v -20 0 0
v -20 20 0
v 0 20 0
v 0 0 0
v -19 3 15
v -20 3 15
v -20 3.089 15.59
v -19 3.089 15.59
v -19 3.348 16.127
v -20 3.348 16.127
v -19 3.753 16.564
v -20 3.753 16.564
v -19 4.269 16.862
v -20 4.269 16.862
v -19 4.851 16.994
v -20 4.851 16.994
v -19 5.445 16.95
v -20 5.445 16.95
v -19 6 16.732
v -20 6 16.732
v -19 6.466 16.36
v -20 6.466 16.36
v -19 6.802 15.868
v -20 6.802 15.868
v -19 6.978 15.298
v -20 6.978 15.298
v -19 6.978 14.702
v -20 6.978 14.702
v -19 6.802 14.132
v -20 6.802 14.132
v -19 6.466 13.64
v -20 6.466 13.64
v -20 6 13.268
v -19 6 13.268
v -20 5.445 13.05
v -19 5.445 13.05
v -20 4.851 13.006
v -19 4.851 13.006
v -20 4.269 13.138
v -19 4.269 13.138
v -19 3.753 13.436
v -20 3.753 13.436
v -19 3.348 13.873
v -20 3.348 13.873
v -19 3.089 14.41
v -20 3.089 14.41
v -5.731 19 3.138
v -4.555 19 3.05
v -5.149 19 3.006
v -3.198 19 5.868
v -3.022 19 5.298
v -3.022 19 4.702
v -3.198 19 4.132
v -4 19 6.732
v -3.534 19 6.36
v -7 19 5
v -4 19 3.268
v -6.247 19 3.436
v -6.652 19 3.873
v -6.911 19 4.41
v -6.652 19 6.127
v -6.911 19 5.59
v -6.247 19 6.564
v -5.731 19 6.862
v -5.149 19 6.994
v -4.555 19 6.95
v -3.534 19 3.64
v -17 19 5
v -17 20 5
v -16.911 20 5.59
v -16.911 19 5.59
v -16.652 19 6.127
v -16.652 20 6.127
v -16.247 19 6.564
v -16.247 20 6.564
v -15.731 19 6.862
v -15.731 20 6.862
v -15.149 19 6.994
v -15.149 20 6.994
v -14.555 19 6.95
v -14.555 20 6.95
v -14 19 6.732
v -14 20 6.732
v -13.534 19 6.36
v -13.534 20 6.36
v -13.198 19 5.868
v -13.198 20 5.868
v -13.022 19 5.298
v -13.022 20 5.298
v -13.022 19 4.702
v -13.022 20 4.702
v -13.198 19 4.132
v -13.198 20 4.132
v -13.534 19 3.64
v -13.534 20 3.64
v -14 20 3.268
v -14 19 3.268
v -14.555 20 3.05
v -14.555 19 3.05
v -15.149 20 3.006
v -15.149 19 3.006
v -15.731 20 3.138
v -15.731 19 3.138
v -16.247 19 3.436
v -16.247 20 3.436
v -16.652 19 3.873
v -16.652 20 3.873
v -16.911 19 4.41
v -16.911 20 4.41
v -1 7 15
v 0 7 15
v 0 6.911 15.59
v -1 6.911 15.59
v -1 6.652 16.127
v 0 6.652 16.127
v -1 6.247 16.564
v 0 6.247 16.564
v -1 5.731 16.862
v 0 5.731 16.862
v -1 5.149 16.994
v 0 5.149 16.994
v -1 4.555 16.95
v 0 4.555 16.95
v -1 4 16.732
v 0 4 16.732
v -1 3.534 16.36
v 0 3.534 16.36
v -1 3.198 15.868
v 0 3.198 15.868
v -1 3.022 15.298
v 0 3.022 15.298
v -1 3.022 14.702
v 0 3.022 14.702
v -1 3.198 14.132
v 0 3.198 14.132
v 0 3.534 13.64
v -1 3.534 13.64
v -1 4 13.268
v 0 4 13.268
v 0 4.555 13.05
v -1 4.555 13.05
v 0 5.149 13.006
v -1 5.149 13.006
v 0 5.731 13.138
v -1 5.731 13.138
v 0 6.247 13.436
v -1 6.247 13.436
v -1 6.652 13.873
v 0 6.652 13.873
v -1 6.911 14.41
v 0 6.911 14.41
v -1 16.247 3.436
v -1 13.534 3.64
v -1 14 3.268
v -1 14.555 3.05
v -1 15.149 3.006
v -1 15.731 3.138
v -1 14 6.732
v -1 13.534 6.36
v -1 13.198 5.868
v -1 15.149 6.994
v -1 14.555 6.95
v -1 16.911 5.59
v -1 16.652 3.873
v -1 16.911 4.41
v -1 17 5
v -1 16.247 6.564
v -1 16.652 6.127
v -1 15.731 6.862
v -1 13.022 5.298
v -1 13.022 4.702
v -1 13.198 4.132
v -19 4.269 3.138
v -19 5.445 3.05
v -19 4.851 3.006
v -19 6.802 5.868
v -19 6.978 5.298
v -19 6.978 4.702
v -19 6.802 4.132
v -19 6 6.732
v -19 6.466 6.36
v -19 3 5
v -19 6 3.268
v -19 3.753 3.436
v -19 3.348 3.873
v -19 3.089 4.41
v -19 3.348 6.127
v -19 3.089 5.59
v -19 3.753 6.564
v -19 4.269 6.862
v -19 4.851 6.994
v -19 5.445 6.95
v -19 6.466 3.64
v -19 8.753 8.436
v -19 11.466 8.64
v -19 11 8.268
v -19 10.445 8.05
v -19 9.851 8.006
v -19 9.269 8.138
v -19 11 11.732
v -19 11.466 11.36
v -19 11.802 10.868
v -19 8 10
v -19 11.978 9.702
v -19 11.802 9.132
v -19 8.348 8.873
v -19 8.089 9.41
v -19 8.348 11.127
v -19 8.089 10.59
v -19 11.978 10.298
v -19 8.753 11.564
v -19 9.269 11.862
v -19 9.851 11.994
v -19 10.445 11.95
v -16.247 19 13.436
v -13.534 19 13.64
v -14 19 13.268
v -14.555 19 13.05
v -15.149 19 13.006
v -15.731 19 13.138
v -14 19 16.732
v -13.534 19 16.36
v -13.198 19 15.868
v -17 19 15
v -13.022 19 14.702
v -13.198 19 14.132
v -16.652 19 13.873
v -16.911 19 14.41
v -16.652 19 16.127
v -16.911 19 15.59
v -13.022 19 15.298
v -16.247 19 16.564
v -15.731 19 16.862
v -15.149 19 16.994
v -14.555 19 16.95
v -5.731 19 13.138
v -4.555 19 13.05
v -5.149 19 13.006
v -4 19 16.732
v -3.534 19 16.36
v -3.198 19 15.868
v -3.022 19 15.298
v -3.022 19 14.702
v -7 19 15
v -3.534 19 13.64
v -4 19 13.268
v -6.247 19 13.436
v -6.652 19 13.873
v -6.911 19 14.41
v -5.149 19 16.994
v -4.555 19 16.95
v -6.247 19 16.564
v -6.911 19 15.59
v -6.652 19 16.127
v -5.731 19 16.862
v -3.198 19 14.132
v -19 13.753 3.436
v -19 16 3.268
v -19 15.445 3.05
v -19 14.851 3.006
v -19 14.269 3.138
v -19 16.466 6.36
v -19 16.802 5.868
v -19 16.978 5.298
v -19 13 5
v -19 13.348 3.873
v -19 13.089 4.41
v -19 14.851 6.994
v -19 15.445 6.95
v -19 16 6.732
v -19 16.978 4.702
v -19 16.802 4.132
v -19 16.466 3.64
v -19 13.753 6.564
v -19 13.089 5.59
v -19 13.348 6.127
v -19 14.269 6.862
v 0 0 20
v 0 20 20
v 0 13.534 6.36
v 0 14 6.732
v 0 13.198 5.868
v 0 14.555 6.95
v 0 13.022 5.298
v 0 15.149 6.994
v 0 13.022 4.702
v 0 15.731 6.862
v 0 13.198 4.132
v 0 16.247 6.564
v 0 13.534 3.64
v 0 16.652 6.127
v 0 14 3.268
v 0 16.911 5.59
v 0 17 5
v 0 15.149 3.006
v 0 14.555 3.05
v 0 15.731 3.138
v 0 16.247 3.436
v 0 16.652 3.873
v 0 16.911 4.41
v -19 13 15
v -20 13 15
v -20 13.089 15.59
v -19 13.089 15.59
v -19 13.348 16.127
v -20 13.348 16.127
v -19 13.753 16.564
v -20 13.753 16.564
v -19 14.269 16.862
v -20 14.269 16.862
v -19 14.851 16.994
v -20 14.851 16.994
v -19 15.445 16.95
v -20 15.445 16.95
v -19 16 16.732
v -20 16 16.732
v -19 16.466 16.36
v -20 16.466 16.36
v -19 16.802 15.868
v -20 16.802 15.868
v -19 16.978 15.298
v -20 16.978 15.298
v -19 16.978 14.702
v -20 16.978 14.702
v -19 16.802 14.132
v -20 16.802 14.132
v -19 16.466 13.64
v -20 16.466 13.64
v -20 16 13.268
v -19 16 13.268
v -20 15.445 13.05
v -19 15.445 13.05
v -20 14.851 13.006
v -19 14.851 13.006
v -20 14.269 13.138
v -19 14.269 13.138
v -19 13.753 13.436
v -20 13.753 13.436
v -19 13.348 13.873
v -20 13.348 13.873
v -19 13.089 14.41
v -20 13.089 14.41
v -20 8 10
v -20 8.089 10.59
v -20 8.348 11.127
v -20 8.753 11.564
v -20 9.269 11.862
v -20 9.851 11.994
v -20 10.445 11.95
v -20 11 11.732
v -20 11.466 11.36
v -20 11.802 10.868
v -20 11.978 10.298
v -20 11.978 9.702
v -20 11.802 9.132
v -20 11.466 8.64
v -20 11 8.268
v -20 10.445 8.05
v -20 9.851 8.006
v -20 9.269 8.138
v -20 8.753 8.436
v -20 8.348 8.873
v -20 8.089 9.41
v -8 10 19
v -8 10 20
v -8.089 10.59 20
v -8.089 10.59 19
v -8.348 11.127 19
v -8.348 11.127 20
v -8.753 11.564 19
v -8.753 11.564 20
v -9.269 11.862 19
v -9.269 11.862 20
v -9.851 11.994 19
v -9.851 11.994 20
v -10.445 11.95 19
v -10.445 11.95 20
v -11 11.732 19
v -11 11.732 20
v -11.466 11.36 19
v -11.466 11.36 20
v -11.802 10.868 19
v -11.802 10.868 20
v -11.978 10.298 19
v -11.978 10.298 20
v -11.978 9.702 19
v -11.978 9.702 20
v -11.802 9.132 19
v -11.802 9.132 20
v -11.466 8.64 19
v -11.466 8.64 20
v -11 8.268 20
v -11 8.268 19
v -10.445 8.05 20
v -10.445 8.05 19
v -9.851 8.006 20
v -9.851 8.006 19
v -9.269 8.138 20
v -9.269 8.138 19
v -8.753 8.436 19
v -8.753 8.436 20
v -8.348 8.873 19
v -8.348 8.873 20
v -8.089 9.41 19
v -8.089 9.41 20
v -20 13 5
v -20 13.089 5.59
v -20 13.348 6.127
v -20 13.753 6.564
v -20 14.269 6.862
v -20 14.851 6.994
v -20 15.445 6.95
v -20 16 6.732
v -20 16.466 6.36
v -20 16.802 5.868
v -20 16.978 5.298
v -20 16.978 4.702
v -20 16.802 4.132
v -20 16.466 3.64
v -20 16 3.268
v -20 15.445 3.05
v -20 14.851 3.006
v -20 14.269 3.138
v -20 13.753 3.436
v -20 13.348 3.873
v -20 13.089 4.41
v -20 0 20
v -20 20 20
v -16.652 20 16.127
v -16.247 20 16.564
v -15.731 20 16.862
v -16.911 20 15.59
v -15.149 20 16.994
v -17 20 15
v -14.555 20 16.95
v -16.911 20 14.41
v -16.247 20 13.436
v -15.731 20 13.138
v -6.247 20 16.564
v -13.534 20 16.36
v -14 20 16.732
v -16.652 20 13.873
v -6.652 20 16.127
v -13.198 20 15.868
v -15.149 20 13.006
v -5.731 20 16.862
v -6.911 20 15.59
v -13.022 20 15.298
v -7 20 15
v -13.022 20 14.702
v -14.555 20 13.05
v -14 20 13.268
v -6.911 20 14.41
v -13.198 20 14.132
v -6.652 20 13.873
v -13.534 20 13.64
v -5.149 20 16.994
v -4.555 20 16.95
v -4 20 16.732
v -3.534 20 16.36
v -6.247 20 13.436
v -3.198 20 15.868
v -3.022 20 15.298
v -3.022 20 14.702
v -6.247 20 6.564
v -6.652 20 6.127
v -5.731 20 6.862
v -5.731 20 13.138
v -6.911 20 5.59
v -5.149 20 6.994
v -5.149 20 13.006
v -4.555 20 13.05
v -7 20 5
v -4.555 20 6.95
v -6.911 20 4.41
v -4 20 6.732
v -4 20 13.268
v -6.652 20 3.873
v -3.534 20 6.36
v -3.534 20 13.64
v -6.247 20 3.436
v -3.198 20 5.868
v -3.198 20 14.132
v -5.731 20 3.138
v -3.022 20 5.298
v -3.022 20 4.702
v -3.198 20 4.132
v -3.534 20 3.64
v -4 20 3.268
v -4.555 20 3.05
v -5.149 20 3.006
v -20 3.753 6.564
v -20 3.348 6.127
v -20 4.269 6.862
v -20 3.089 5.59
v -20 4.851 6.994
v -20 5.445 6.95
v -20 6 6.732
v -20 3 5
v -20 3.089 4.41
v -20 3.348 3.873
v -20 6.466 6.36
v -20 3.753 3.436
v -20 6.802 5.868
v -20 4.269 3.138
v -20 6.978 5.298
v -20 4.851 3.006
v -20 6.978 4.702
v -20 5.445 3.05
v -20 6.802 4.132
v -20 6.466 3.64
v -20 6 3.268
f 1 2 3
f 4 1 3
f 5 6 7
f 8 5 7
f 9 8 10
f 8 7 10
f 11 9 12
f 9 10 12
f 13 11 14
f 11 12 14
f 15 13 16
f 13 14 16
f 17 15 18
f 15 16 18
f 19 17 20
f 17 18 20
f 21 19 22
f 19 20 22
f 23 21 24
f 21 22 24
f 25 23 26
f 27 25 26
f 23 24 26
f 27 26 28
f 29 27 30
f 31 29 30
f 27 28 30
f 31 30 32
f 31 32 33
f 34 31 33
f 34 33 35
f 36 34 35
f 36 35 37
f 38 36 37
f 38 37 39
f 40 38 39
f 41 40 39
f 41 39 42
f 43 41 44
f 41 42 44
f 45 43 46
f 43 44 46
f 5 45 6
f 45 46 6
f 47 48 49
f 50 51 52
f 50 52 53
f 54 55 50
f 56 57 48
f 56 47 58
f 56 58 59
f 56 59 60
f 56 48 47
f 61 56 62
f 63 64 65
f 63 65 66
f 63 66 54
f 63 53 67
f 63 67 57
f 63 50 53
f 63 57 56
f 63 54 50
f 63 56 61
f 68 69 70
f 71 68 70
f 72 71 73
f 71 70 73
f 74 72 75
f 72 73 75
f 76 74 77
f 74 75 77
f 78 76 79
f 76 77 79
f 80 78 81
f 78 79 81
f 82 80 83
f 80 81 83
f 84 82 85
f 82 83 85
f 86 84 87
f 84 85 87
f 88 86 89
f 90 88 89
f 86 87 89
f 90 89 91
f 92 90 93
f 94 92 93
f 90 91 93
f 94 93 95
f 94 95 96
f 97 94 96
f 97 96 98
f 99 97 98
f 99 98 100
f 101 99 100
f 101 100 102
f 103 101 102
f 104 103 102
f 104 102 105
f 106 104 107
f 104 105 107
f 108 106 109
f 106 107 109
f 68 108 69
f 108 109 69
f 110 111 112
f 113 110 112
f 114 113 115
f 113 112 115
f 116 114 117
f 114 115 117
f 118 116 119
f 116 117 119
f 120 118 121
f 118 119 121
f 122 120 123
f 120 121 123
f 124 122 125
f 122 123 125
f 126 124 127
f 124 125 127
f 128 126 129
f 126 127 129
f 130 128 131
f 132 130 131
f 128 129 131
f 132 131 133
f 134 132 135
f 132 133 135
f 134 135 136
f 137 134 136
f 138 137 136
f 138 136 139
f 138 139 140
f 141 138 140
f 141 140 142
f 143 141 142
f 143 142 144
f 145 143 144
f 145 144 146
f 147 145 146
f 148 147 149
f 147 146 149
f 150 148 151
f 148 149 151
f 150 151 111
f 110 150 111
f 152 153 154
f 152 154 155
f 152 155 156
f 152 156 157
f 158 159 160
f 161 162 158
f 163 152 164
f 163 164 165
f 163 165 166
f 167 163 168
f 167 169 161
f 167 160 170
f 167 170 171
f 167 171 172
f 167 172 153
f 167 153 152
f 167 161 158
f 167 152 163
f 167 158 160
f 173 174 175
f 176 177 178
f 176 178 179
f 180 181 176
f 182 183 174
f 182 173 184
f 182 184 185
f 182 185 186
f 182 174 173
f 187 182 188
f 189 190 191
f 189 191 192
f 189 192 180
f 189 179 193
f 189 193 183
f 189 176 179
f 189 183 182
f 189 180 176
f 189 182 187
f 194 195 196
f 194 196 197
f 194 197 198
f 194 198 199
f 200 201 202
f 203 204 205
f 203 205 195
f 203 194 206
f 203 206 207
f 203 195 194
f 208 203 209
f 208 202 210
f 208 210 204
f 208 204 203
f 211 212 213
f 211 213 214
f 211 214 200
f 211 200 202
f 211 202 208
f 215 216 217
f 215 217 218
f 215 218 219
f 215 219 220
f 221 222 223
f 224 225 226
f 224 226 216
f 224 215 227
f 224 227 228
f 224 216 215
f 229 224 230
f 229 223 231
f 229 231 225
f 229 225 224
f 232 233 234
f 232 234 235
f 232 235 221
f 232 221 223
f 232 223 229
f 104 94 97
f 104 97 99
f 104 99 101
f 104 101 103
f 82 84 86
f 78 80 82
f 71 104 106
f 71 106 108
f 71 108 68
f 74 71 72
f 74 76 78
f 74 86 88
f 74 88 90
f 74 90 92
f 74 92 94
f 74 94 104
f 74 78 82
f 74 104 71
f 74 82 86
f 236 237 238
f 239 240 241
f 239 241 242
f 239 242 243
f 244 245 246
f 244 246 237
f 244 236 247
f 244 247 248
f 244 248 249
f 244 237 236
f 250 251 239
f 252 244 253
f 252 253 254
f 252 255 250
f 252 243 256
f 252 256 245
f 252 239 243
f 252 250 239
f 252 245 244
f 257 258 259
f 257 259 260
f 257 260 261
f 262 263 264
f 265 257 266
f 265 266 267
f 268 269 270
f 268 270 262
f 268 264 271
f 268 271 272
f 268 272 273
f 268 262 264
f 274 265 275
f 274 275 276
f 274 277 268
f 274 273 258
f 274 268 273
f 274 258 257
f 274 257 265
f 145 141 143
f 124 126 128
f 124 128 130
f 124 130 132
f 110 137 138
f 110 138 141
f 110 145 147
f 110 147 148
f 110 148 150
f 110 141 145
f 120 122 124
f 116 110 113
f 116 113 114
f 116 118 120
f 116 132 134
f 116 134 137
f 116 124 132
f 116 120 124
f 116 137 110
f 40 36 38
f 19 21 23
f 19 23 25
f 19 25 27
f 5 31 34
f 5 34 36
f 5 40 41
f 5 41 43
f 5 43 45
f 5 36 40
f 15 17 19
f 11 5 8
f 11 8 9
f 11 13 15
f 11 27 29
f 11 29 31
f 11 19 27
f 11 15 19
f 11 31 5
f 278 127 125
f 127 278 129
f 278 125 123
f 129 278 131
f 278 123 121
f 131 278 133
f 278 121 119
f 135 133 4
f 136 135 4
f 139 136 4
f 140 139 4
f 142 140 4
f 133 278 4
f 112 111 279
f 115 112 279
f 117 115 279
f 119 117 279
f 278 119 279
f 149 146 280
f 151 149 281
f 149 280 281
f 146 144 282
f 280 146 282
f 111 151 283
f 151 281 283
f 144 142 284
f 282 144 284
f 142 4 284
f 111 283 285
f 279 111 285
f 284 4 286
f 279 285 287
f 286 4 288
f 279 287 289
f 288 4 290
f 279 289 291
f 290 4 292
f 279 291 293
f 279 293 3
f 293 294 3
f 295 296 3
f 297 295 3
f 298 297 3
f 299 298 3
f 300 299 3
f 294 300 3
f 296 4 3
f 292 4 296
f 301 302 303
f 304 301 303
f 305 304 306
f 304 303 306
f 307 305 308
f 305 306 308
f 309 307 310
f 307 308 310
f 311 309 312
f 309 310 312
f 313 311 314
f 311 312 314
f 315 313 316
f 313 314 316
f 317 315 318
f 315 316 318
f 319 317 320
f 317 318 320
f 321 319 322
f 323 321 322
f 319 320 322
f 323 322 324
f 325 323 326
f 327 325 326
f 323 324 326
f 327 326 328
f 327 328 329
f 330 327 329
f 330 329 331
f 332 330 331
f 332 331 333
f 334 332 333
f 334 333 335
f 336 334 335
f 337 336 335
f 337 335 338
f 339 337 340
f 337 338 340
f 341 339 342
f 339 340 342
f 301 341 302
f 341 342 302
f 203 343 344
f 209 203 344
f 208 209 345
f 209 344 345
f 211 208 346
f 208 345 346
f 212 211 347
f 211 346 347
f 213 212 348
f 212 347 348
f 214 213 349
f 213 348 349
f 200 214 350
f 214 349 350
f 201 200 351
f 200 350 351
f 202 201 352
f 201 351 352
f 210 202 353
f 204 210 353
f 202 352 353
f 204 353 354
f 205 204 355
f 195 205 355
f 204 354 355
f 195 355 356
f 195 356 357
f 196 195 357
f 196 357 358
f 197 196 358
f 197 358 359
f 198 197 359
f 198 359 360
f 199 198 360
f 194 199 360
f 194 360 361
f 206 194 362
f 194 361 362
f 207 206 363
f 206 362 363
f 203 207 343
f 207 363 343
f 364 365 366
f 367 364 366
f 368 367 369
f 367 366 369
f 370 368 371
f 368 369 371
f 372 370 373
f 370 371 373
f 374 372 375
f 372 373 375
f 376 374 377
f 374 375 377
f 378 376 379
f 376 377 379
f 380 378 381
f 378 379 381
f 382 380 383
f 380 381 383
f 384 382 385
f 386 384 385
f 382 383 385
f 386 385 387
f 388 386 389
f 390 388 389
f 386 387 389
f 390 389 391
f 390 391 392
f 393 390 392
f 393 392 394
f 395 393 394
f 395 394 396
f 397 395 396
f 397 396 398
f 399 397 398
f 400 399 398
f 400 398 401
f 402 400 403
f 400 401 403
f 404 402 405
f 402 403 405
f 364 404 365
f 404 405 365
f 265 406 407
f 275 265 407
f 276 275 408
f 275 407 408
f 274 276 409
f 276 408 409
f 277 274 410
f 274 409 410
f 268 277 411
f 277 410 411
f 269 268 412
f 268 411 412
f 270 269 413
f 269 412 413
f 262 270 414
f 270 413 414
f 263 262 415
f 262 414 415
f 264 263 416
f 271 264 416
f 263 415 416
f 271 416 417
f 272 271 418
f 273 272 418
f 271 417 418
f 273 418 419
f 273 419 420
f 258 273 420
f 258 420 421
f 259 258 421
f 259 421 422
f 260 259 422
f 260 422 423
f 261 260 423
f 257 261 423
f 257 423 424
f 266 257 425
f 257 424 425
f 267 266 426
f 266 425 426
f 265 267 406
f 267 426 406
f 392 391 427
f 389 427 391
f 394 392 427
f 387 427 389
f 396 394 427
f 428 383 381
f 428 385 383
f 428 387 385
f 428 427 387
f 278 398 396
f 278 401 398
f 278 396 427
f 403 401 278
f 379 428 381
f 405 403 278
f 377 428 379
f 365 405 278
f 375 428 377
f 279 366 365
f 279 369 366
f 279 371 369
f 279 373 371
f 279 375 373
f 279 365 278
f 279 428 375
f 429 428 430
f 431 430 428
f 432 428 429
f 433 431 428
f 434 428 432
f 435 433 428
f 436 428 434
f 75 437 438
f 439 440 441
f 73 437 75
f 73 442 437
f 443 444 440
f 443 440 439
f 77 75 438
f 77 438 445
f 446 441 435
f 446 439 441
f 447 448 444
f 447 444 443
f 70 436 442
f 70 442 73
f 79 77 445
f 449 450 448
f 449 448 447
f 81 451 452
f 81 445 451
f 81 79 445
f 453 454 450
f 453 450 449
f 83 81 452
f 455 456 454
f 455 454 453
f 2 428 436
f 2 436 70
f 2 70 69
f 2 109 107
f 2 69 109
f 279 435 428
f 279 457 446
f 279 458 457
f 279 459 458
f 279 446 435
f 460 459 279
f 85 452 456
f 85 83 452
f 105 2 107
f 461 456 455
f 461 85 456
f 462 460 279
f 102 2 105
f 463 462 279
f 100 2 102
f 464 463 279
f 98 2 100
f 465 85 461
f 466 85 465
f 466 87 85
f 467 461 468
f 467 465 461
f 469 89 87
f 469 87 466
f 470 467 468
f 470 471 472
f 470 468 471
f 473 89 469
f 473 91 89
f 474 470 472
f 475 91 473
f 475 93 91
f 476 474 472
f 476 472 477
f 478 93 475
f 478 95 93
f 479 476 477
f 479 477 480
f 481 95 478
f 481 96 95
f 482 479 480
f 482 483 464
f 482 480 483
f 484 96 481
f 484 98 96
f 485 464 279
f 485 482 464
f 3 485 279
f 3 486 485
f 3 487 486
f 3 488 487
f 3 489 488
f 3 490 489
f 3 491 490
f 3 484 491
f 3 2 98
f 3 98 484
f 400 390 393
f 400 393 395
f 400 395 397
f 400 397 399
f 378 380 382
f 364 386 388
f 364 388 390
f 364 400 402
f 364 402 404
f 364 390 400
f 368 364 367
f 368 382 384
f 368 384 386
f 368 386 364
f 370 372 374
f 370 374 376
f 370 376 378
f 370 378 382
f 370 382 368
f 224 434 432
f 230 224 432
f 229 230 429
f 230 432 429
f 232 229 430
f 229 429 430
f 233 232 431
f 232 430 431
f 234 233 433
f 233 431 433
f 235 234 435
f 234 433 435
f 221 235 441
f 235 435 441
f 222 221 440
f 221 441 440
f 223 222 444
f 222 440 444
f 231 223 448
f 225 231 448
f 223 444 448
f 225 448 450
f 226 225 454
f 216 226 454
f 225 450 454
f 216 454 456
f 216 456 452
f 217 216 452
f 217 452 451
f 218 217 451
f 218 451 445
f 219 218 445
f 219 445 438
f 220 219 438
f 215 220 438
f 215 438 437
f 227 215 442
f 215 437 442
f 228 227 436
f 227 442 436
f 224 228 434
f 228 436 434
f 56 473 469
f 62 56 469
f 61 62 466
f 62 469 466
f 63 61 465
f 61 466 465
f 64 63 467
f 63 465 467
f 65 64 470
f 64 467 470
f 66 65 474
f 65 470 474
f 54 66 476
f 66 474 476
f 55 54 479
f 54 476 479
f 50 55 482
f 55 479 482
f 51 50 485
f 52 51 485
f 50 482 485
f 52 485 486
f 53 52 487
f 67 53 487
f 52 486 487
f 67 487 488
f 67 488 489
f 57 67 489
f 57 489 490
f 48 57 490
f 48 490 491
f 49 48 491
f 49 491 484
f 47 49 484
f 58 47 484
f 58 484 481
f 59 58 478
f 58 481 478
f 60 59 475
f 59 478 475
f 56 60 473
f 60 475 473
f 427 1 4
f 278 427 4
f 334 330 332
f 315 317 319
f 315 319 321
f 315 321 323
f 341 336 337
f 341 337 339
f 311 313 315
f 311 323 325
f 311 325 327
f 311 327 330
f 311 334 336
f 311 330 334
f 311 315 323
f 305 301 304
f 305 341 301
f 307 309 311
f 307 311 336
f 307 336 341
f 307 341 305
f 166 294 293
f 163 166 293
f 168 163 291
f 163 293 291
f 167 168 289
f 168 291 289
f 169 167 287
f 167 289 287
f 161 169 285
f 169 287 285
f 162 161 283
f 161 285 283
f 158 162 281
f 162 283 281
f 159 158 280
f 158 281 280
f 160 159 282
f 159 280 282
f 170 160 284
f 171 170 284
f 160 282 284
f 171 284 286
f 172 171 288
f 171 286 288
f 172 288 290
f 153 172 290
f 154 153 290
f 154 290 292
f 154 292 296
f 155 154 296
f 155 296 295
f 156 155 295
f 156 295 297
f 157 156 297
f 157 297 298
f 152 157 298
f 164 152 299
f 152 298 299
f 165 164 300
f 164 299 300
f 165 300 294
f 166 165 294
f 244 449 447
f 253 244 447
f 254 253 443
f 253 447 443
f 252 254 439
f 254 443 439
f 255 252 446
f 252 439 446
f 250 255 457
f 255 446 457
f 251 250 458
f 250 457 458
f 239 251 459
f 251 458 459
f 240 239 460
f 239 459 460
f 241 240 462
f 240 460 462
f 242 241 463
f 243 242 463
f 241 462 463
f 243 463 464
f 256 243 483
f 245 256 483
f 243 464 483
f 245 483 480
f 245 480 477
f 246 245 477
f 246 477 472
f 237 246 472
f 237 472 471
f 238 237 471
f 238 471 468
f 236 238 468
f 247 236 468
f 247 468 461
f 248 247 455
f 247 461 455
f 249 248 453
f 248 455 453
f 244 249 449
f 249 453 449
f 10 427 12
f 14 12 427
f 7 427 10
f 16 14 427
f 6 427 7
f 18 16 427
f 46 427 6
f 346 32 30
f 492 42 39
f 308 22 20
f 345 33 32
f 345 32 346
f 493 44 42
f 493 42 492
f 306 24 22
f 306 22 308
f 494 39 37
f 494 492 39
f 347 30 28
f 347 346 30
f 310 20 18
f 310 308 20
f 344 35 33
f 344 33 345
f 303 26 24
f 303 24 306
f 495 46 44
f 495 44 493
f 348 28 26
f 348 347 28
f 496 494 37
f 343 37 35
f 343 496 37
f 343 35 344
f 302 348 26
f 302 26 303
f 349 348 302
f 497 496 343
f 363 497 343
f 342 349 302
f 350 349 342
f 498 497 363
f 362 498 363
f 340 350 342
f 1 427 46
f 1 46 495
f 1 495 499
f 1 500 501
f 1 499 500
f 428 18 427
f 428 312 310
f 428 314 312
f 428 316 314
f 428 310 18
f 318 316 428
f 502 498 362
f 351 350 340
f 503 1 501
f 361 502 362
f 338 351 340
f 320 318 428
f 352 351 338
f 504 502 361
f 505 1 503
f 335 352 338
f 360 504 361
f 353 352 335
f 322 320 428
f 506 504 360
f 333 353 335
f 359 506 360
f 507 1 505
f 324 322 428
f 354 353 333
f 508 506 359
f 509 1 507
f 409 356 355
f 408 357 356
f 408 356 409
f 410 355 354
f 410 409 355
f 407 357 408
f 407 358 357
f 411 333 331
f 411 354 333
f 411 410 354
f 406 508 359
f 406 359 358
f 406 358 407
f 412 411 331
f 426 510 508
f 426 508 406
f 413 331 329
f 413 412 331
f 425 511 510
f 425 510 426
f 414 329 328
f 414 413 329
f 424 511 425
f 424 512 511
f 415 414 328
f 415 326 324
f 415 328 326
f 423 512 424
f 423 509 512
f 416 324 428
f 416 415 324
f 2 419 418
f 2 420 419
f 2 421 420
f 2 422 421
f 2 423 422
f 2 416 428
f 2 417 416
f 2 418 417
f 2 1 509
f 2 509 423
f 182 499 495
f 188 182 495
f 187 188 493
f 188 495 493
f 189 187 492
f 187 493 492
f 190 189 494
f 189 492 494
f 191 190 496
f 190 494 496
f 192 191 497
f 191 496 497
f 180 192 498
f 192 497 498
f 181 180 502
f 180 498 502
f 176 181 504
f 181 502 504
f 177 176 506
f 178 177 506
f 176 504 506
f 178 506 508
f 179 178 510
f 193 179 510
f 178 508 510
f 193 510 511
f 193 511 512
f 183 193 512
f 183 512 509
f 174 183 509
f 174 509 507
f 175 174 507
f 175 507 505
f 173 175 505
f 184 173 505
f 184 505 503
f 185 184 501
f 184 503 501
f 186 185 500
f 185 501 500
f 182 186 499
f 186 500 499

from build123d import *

# Parameters (mm, degrees)
F0_W     = 20
F0_H     = 20
F1_DEPTH = 20
F2_R     = 2
F4_DEPTH = 1
F3_R     = 2
F5_DEPTH = 1
F6_R     = 2
F7_DEPTH = 1
F8_R     = 2
F9_DEPTH = 1


with BuildPart() as f1:
    # F0 (on Top) → F1 (new body)
    with BuildSketch(Plane.XY):
        with Locations((-10, 10)):
            Rectangle(F0_W, F0_H)
    extrude(amount=F1_DEPTH)

    # F2 (on face) → F4 (cut)
    with BuildSketch(Plane.XY.offset(20)):
        with Locations((-10, 10)):
            Circle(F2_R)
    extrude(amount=-F4_DEPTH, mode=Mode.SUBTRACT)

    # F3 (on face) → F5 (cut)
    with BuildSketch(Plane.YZ):
        with Locations((15, 5)):
            Circle(F3_R)
        with Locations((5, 15)):
            Circle(F3_R)
    extrude(amount=-F5_DEPTH, mode=Mode.SUBTRACT)

    # F6 (on face) → F7 (cut)
    with BuildSketch(Plane(origin=(0, 20, 0), x_dir=(-1, 0, 0), z_dir=(0, 1, 0))):
        with Locations((15, 5)):
            Circle(F6_R)
        with Locations((5, 5)):
            Circle(F6_R)
        with Locations((5, 15)):
            Circle(F6_R)
        with Locations((15, 15)):
            Circle(F6_R)
    extrude(amount=-F7_DEPTH, mode=Mode.SUBTRACT)

    # F8 (on face) → F9 (cut)
    with BuildSketch(Plane(origin=(-20, 0, 0), x_dir=(0, -1, 0), z_dir=(-1, 0, 0))):
        with Locations((-10, 10)):
            Circle(F8_R)
        with Locations((-5, 15)):
            Circle(F8_R)
        with Locations((-5, 5)):
            Circle(F8_R)
        with Locations((-15, 5)):
            Circle(F8_R)
        with Locations((-15, 15)):
            Circle(F8_R)
    extrude(amount=-F9_DEPTH, mode=Mode.SUBTRACT)


solid = f1.part
